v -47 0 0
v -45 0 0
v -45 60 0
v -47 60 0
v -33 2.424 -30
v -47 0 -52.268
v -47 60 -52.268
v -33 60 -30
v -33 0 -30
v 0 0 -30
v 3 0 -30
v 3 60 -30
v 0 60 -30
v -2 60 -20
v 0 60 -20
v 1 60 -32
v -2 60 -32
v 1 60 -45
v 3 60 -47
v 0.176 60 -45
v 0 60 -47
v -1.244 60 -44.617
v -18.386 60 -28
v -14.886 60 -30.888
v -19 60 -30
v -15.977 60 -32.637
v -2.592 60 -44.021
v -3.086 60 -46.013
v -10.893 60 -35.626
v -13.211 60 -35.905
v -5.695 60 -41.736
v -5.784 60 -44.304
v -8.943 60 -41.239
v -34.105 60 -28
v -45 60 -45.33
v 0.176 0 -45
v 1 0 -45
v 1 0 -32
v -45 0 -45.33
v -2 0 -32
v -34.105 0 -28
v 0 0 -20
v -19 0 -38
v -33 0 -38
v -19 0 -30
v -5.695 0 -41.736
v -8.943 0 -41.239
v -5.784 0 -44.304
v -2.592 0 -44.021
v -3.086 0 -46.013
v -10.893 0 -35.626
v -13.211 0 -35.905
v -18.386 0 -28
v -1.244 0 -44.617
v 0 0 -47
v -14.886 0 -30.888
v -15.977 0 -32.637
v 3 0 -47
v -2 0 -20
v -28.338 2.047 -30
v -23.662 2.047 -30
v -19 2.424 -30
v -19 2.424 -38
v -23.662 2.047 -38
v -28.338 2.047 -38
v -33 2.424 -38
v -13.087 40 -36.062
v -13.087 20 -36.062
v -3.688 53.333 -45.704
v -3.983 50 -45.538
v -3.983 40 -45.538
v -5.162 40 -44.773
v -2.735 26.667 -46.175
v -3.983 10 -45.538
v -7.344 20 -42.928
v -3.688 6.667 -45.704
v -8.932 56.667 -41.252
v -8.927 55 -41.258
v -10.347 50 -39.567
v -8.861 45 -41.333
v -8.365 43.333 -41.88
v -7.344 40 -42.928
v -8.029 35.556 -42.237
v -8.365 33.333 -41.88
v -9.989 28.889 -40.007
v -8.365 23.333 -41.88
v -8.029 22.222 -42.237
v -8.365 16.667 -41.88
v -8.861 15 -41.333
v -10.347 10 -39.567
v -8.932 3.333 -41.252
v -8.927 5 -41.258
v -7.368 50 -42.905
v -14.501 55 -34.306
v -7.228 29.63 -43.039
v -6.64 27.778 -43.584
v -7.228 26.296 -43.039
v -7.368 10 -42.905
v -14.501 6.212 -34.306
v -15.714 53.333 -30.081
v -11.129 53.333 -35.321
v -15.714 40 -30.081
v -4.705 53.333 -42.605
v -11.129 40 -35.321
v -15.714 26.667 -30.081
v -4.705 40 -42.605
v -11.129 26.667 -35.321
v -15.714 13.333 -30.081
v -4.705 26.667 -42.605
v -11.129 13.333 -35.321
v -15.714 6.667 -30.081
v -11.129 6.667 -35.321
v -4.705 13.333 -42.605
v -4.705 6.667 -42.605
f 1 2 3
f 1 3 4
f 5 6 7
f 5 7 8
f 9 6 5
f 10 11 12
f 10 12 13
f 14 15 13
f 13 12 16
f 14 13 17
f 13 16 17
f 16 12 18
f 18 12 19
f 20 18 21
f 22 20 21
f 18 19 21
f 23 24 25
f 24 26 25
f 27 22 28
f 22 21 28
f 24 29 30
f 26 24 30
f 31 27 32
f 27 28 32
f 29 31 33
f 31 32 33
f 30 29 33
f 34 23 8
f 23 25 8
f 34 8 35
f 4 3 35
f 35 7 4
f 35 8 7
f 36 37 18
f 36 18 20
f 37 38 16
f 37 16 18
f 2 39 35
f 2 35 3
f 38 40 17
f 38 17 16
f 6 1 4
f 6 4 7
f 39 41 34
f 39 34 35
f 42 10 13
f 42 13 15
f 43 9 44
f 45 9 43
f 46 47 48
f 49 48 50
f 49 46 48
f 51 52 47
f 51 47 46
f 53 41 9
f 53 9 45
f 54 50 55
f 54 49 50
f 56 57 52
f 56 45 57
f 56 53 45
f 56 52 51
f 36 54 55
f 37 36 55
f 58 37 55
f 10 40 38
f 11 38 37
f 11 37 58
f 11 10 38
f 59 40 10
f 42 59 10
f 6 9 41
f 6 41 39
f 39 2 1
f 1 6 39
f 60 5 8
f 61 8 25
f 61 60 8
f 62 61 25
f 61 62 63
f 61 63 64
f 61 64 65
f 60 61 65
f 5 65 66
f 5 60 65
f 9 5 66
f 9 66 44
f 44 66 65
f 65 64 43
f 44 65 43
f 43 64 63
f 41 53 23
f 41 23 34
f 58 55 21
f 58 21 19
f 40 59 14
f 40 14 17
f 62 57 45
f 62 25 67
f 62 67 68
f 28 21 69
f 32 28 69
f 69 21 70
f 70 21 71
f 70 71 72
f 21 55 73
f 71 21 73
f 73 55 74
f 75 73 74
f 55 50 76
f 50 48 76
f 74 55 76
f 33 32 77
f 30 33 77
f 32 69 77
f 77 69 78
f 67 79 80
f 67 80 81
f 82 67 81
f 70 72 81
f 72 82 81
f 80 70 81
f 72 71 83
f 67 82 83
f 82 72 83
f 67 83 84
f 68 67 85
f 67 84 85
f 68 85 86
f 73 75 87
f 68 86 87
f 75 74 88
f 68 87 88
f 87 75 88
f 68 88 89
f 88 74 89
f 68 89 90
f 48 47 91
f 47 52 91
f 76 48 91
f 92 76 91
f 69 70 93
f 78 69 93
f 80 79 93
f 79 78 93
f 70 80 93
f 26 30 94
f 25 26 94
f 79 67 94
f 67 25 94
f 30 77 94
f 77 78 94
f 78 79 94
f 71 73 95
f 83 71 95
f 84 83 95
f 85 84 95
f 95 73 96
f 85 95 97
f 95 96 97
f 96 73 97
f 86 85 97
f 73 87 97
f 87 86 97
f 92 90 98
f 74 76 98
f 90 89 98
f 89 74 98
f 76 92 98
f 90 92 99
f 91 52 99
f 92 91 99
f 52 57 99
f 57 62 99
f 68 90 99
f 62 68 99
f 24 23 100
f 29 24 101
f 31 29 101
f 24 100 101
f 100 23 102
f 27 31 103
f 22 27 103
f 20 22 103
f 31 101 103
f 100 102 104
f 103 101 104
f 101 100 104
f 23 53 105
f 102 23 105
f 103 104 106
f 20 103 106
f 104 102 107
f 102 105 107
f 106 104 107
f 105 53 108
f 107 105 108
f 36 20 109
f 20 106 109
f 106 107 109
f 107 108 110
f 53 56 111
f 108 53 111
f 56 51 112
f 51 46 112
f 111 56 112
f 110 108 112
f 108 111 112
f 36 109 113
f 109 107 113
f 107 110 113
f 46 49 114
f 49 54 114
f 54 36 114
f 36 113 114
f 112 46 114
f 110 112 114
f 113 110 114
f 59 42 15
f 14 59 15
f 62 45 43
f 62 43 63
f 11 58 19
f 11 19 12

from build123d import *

# Parameters (mm, degrees)
BOSS_EXTRUDE12_DEPTH = 60
BOSS_EXTRUDE13_DEPTH = 8
SKETCH3_W            = 20
SKETCH3_H            = 60
CUT_EXTRUDE1_DEPTH   = 10


with BuildPart() as part:
    # Sketch1 → Boss-Extrude12 (new body)
    with BuildSketch(Plane(origin=(0, 0, 0), x_dir=(1, 0, 0), z_dir=(0, 1, 0))):
        with BuildLine():
            Line((3, 47), (3, 30))
            Line((3, 30), (0, 30))
            Line((0, 30), (0, 0))
            Line((0, 0), (-2, 0))
            Line((-2, 0), (-2, 32))
            Line((-2, 32), (1, 32))
            Line((1, 32), (1, 45))
            Line((1, 45), (0.176102142, 45))
            add(Edge.make_bspline(
                [(-18.386432119, 28), (-18.281589374, 28.071011485), (-18.076006872, 28.210643772), (-17.632017964, 28.509033814), (-16.788752159, 29.127765228), (-15.266101597, 30.436706514), (-13.281769764, 32.578807621), (-11.116323446, 35.322397153), (-8.327983452, 38.971629637), (-4.796332276, 42.989291988), (-1.605396872, 44.667429051), (0.176102142, 45)],
                knots=[0.007315744, 0.007315744, 0.007315744, 0.007315744, 0.023228008, 0.039140272, 0.0709648, 0.134613856, 0.261911967, 0.389210078, 0.516508189, 0.771104411, 1.025700634, 1.025700634, 1.025700634, 1.025700634], degree=3))
            Line((-18.386432119, 28), (-34.105031298, 28))
            Line((-34.105031298, 28), (-45, 45.32952773))
            Line((-45, 45.32952773), (-45, 0))
            Line((-45, 0), (-47, 0))
            Line((-47, 0), (-47, 52.268387809))
            Line((-47, 52.268387809), (-33, 30))
            Line((-33, 30), (-19, 30))
            add(Edge.make_bspline(
                [(0, 47), (-8.735842334, 45.522262704), (-12.411198706, 34.462689008), (-19, 30)],
                knots=[0, 0, 0, 0, 1, 1, 1, 1], degree=3))
            Line((0, 47), (3, 47))
        make_face()
    extrude(amount=BOSS_EXTRUDE12_DEPTH)

    # Sketch2 → Boss-Extrude13 (add)
    with BuildSketch(Plane(origin=(0, 0, -30), x_dir=(-1, 0, 0), z_dir=(0, 0, -1))):
        with BuildLine():
            Line((33, 0), (19, 0))
            Line((19, 0), (19, 2.423963318))
            ThreePointArc((19, 2.423963318), (26, 2), (33, 2.423963318))
            Line((33, 2.423963318), (33, 0))
        make_face()
    extrude(amount=BOSS_EXTRUDE13_DEPTH)

    # Sketch3 → Cut-Extrude1 (cut)
    with BuildSketch(Plane(origin=(0, 0, 0), x_dir=(0, 0, -1), z_dir=(1, 0, 0))):
        with Locations((10, 30)):
            Rectangle(SKETCH3_W, SKETCH3_H)
    extrude(amount=-CUT_EXTRUDE1_DEPTH, mode=Mode.SUBTRACT)


solid = part.part
